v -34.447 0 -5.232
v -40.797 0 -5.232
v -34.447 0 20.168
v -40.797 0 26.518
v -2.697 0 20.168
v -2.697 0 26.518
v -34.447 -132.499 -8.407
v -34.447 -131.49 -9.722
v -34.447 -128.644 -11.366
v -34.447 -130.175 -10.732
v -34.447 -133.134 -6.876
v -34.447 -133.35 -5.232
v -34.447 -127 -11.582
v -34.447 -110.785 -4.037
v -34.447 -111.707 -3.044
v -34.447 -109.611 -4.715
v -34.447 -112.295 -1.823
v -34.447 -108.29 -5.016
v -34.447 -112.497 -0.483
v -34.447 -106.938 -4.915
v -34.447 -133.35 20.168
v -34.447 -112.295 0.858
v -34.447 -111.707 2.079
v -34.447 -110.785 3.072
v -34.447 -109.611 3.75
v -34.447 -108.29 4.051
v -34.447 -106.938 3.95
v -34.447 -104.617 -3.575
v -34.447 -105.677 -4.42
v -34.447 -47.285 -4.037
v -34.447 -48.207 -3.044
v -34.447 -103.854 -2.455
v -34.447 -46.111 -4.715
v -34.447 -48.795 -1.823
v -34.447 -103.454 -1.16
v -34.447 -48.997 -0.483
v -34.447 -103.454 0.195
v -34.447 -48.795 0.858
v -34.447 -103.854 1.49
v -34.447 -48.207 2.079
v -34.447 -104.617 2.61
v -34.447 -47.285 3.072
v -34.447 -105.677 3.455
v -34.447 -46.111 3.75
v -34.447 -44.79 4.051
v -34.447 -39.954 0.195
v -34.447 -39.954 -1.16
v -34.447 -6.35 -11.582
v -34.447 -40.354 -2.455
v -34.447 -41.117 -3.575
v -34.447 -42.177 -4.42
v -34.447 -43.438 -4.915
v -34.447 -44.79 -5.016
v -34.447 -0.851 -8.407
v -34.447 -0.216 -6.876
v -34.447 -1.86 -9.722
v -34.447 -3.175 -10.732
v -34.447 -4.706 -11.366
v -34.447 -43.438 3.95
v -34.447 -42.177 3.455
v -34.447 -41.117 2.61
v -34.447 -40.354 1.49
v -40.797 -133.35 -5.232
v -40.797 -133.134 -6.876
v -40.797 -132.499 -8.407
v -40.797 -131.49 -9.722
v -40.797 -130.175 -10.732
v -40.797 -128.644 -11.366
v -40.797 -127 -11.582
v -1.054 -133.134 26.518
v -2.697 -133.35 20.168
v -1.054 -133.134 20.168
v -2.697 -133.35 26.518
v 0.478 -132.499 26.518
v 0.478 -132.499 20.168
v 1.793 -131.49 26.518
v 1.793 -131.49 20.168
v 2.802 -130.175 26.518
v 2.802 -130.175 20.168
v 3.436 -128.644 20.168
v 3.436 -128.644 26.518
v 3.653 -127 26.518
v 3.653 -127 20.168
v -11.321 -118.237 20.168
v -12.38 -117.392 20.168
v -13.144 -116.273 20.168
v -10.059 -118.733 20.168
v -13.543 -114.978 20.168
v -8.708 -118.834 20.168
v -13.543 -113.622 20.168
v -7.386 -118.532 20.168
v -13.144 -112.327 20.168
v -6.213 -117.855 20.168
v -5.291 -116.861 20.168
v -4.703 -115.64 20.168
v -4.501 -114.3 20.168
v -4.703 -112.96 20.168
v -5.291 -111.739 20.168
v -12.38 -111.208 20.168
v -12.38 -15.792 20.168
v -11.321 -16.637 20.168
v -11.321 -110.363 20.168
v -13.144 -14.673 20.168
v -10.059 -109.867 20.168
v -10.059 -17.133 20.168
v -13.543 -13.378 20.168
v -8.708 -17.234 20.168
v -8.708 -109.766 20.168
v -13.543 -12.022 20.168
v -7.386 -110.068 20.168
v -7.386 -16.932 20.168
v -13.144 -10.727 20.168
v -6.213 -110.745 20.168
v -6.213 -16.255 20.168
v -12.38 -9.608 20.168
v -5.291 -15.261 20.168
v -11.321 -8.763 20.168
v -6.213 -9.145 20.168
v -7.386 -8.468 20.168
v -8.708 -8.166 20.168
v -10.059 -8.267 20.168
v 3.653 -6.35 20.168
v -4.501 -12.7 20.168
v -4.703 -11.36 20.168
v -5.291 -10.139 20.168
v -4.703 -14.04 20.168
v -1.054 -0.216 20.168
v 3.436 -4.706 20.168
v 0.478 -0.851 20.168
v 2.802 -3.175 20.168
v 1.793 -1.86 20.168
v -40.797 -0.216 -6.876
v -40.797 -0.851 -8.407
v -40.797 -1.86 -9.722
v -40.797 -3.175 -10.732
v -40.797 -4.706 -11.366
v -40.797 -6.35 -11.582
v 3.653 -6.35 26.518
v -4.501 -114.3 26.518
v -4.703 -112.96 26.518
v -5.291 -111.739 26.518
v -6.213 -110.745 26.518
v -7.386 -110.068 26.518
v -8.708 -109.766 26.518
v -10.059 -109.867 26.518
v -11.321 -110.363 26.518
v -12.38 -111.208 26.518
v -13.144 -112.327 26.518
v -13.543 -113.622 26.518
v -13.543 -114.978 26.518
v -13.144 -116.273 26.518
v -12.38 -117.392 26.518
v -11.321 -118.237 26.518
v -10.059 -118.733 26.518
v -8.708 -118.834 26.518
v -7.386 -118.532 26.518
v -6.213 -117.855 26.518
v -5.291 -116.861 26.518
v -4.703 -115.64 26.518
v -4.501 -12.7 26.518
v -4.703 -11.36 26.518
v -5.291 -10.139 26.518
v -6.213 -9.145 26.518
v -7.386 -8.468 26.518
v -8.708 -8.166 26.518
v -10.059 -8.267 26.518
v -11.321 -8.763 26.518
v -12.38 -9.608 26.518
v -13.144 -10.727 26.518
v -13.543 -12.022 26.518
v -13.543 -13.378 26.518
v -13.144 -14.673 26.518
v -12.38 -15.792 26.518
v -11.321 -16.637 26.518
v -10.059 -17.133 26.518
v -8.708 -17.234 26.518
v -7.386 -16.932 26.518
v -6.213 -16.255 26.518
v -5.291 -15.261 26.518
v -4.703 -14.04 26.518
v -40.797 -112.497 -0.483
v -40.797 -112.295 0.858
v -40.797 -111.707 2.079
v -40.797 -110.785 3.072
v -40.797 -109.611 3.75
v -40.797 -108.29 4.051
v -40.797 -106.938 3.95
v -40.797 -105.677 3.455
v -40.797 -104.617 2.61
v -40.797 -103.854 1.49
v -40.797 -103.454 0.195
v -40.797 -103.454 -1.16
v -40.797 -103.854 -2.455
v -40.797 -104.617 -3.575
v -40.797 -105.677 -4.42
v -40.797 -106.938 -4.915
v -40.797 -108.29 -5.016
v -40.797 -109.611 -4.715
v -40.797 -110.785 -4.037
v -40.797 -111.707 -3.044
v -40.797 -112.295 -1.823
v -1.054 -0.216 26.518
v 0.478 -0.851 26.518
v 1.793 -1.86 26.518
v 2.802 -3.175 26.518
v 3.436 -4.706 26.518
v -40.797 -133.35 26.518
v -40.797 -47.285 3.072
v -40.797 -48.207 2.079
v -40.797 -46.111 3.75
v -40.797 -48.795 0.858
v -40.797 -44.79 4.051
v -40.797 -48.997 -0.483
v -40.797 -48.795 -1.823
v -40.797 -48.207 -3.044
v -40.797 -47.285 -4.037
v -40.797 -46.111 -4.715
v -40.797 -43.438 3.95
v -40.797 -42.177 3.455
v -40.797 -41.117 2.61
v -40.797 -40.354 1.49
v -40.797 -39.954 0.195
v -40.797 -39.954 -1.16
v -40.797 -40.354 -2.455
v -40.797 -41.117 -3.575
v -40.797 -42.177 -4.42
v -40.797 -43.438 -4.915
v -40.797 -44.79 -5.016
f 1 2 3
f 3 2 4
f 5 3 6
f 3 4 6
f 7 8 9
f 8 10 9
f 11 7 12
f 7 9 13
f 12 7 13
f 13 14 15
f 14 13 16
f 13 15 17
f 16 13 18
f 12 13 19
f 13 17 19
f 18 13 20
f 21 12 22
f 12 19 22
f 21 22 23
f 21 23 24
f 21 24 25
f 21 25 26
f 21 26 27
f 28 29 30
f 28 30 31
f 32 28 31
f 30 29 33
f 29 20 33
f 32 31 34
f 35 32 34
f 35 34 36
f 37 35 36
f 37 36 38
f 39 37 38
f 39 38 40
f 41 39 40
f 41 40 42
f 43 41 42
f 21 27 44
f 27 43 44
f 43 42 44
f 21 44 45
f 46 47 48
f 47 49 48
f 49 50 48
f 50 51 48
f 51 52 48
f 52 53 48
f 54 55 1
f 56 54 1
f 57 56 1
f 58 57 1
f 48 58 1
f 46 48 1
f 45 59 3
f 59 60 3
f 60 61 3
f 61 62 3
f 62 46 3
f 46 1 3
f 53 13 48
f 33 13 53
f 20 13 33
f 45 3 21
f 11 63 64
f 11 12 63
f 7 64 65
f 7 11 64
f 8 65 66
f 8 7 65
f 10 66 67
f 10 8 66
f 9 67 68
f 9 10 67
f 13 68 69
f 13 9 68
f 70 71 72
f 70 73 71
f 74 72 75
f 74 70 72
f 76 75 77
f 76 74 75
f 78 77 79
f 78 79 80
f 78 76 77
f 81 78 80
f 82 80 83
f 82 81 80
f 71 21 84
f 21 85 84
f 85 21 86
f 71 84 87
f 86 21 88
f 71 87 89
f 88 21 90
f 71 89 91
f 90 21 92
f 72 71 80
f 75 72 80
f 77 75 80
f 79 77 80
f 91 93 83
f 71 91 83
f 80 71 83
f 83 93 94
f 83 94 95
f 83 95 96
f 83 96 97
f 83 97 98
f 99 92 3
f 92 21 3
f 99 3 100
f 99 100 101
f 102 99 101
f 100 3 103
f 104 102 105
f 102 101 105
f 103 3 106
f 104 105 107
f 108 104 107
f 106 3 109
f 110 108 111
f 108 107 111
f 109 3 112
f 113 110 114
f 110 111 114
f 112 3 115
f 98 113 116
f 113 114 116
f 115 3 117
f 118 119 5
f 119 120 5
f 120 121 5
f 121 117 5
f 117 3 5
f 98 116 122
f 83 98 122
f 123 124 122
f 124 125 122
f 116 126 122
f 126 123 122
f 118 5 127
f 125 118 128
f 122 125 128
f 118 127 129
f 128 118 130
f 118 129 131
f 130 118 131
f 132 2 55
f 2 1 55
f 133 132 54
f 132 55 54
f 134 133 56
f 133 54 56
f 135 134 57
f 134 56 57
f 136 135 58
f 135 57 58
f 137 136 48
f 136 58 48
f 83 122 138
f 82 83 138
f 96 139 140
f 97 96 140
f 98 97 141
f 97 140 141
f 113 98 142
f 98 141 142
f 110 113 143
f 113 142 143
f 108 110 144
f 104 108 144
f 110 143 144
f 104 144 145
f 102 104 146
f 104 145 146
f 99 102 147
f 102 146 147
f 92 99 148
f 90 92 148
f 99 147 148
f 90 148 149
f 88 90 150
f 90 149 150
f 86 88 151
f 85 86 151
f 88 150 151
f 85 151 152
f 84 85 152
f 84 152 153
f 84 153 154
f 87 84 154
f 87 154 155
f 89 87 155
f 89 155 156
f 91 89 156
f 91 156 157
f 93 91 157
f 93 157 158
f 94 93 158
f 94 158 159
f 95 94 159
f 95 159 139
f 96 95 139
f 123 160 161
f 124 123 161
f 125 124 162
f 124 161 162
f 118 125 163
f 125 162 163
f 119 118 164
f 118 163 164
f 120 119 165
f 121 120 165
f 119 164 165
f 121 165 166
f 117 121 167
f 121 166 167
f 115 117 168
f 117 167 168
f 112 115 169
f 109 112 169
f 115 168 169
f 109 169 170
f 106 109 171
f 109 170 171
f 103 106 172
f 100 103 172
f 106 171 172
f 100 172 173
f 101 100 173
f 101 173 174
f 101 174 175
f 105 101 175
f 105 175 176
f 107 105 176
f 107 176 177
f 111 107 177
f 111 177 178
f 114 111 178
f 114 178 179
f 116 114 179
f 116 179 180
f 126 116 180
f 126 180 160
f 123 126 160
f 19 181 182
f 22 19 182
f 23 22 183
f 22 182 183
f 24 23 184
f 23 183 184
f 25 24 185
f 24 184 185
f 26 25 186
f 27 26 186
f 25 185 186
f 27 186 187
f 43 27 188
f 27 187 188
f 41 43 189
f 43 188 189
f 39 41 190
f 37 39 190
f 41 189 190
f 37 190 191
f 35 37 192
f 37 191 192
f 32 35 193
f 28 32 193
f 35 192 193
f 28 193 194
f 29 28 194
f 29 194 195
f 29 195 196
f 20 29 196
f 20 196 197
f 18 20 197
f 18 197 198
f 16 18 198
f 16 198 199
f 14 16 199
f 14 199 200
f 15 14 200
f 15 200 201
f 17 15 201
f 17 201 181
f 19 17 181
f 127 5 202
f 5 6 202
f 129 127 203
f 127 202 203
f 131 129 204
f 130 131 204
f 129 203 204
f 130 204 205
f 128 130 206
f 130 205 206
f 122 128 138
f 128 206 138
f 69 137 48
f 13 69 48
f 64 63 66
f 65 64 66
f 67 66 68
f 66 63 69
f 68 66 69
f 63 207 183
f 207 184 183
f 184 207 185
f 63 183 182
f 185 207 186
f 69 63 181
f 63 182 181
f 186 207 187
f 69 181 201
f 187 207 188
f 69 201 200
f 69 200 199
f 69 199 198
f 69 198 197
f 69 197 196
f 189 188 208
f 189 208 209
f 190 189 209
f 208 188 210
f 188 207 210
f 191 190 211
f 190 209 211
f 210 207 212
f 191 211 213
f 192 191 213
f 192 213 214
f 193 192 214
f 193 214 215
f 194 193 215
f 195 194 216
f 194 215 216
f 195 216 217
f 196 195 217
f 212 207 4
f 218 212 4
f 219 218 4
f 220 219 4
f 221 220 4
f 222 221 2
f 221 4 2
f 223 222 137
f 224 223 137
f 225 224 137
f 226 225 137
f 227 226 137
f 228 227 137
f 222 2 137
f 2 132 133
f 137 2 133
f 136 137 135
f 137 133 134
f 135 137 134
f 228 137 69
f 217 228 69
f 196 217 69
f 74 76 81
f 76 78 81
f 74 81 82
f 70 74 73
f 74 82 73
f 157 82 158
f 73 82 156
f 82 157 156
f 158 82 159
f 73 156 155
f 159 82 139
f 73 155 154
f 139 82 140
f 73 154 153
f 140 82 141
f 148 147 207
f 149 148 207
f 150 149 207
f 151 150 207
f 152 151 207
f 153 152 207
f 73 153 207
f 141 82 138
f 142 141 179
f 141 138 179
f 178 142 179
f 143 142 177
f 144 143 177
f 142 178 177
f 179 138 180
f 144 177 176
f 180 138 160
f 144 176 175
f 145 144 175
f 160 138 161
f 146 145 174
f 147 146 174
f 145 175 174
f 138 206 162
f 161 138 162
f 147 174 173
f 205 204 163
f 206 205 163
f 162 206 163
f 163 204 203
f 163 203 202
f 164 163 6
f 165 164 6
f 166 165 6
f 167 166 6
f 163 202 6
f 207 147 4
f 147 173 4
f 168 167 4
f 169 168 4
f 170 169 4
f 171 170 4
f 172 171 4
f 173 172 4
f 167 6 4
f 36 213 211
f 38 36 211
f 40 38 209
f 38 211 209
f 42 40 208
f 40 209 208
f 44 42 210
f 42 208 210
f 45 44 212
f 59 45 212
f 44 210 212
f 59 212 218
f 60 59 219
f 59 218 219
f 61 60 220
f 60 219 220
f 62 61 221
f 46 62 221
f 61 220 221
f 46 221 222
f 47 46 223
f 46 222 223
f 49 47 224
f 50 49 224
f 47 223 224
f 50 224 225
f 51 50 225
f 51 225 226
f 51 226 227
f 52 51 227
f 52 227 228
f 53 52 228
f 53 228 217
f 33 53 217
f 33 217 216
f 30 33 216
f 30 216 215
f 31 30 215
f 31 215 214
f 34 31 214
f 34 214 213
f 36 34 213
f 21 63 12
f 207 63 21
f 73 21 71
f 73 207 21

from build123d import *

# Parameters (mm, degrees)
F1_DEPTH = 133.35
F2_R     = 4.5466
F3_DEPTH = 25.4
F4_R     = 4.5466
F5_DEPTH = 25.4
F6_R     = 6.35


with BuildPart() as f1:
    # F0 (on Front) → F1 (new body)
    with BuildSketch(Plane.XZ):
        Polygon((-40.797278, 26.517693), (-40.797278, -11.582307), (-34.447278, -11.582307), (-34.447278, 20.167693), (3.652722, 20.167693), (3.652722, 26.517693), align=None)
    extrude(amount=F1_DEPTH)

    # F2 (on face) → F3 (cut)
    with BuildSketch(Plane(origin=(-40.797278, 0, 0), x_dir=(0, -1, 0), z_dir=(-1, 0, 0))):
        with Locations((107.95, -0.482507)):
            Circle(F2_R)
        with Locations((44.45, -0.482507)):
            Circle(F2_R)
    extrude(amount=-F3_DEPTH, mode=Mode.SUBTRACT)

    # F4 (on face) → F5 (cut)
    with BuildSketch(Plane.XY.offset(26.517693)):
        with Locations((-9.047278, -12.7)):
            Circle(F4_R)
        with Locations((-9.047278, -114.3)):
            Circle(F4_R)
    extrude(amount=-F5_DEPTH, mode=Mode.SUBTRACT)

    # F6
    f6_edges = [f1.edges().sort_by_distance(p)[0] for p in [
        (3.652722, 0, 23.342693),
        (-37.622278, 0, -11.582307),
        (3.652722, -133.35, 23.342693),
        (-37.622278, -133.35, -11.582307),
    ]]
    fillet(f6_edges, radius=F6_R)


solid = f1.part
